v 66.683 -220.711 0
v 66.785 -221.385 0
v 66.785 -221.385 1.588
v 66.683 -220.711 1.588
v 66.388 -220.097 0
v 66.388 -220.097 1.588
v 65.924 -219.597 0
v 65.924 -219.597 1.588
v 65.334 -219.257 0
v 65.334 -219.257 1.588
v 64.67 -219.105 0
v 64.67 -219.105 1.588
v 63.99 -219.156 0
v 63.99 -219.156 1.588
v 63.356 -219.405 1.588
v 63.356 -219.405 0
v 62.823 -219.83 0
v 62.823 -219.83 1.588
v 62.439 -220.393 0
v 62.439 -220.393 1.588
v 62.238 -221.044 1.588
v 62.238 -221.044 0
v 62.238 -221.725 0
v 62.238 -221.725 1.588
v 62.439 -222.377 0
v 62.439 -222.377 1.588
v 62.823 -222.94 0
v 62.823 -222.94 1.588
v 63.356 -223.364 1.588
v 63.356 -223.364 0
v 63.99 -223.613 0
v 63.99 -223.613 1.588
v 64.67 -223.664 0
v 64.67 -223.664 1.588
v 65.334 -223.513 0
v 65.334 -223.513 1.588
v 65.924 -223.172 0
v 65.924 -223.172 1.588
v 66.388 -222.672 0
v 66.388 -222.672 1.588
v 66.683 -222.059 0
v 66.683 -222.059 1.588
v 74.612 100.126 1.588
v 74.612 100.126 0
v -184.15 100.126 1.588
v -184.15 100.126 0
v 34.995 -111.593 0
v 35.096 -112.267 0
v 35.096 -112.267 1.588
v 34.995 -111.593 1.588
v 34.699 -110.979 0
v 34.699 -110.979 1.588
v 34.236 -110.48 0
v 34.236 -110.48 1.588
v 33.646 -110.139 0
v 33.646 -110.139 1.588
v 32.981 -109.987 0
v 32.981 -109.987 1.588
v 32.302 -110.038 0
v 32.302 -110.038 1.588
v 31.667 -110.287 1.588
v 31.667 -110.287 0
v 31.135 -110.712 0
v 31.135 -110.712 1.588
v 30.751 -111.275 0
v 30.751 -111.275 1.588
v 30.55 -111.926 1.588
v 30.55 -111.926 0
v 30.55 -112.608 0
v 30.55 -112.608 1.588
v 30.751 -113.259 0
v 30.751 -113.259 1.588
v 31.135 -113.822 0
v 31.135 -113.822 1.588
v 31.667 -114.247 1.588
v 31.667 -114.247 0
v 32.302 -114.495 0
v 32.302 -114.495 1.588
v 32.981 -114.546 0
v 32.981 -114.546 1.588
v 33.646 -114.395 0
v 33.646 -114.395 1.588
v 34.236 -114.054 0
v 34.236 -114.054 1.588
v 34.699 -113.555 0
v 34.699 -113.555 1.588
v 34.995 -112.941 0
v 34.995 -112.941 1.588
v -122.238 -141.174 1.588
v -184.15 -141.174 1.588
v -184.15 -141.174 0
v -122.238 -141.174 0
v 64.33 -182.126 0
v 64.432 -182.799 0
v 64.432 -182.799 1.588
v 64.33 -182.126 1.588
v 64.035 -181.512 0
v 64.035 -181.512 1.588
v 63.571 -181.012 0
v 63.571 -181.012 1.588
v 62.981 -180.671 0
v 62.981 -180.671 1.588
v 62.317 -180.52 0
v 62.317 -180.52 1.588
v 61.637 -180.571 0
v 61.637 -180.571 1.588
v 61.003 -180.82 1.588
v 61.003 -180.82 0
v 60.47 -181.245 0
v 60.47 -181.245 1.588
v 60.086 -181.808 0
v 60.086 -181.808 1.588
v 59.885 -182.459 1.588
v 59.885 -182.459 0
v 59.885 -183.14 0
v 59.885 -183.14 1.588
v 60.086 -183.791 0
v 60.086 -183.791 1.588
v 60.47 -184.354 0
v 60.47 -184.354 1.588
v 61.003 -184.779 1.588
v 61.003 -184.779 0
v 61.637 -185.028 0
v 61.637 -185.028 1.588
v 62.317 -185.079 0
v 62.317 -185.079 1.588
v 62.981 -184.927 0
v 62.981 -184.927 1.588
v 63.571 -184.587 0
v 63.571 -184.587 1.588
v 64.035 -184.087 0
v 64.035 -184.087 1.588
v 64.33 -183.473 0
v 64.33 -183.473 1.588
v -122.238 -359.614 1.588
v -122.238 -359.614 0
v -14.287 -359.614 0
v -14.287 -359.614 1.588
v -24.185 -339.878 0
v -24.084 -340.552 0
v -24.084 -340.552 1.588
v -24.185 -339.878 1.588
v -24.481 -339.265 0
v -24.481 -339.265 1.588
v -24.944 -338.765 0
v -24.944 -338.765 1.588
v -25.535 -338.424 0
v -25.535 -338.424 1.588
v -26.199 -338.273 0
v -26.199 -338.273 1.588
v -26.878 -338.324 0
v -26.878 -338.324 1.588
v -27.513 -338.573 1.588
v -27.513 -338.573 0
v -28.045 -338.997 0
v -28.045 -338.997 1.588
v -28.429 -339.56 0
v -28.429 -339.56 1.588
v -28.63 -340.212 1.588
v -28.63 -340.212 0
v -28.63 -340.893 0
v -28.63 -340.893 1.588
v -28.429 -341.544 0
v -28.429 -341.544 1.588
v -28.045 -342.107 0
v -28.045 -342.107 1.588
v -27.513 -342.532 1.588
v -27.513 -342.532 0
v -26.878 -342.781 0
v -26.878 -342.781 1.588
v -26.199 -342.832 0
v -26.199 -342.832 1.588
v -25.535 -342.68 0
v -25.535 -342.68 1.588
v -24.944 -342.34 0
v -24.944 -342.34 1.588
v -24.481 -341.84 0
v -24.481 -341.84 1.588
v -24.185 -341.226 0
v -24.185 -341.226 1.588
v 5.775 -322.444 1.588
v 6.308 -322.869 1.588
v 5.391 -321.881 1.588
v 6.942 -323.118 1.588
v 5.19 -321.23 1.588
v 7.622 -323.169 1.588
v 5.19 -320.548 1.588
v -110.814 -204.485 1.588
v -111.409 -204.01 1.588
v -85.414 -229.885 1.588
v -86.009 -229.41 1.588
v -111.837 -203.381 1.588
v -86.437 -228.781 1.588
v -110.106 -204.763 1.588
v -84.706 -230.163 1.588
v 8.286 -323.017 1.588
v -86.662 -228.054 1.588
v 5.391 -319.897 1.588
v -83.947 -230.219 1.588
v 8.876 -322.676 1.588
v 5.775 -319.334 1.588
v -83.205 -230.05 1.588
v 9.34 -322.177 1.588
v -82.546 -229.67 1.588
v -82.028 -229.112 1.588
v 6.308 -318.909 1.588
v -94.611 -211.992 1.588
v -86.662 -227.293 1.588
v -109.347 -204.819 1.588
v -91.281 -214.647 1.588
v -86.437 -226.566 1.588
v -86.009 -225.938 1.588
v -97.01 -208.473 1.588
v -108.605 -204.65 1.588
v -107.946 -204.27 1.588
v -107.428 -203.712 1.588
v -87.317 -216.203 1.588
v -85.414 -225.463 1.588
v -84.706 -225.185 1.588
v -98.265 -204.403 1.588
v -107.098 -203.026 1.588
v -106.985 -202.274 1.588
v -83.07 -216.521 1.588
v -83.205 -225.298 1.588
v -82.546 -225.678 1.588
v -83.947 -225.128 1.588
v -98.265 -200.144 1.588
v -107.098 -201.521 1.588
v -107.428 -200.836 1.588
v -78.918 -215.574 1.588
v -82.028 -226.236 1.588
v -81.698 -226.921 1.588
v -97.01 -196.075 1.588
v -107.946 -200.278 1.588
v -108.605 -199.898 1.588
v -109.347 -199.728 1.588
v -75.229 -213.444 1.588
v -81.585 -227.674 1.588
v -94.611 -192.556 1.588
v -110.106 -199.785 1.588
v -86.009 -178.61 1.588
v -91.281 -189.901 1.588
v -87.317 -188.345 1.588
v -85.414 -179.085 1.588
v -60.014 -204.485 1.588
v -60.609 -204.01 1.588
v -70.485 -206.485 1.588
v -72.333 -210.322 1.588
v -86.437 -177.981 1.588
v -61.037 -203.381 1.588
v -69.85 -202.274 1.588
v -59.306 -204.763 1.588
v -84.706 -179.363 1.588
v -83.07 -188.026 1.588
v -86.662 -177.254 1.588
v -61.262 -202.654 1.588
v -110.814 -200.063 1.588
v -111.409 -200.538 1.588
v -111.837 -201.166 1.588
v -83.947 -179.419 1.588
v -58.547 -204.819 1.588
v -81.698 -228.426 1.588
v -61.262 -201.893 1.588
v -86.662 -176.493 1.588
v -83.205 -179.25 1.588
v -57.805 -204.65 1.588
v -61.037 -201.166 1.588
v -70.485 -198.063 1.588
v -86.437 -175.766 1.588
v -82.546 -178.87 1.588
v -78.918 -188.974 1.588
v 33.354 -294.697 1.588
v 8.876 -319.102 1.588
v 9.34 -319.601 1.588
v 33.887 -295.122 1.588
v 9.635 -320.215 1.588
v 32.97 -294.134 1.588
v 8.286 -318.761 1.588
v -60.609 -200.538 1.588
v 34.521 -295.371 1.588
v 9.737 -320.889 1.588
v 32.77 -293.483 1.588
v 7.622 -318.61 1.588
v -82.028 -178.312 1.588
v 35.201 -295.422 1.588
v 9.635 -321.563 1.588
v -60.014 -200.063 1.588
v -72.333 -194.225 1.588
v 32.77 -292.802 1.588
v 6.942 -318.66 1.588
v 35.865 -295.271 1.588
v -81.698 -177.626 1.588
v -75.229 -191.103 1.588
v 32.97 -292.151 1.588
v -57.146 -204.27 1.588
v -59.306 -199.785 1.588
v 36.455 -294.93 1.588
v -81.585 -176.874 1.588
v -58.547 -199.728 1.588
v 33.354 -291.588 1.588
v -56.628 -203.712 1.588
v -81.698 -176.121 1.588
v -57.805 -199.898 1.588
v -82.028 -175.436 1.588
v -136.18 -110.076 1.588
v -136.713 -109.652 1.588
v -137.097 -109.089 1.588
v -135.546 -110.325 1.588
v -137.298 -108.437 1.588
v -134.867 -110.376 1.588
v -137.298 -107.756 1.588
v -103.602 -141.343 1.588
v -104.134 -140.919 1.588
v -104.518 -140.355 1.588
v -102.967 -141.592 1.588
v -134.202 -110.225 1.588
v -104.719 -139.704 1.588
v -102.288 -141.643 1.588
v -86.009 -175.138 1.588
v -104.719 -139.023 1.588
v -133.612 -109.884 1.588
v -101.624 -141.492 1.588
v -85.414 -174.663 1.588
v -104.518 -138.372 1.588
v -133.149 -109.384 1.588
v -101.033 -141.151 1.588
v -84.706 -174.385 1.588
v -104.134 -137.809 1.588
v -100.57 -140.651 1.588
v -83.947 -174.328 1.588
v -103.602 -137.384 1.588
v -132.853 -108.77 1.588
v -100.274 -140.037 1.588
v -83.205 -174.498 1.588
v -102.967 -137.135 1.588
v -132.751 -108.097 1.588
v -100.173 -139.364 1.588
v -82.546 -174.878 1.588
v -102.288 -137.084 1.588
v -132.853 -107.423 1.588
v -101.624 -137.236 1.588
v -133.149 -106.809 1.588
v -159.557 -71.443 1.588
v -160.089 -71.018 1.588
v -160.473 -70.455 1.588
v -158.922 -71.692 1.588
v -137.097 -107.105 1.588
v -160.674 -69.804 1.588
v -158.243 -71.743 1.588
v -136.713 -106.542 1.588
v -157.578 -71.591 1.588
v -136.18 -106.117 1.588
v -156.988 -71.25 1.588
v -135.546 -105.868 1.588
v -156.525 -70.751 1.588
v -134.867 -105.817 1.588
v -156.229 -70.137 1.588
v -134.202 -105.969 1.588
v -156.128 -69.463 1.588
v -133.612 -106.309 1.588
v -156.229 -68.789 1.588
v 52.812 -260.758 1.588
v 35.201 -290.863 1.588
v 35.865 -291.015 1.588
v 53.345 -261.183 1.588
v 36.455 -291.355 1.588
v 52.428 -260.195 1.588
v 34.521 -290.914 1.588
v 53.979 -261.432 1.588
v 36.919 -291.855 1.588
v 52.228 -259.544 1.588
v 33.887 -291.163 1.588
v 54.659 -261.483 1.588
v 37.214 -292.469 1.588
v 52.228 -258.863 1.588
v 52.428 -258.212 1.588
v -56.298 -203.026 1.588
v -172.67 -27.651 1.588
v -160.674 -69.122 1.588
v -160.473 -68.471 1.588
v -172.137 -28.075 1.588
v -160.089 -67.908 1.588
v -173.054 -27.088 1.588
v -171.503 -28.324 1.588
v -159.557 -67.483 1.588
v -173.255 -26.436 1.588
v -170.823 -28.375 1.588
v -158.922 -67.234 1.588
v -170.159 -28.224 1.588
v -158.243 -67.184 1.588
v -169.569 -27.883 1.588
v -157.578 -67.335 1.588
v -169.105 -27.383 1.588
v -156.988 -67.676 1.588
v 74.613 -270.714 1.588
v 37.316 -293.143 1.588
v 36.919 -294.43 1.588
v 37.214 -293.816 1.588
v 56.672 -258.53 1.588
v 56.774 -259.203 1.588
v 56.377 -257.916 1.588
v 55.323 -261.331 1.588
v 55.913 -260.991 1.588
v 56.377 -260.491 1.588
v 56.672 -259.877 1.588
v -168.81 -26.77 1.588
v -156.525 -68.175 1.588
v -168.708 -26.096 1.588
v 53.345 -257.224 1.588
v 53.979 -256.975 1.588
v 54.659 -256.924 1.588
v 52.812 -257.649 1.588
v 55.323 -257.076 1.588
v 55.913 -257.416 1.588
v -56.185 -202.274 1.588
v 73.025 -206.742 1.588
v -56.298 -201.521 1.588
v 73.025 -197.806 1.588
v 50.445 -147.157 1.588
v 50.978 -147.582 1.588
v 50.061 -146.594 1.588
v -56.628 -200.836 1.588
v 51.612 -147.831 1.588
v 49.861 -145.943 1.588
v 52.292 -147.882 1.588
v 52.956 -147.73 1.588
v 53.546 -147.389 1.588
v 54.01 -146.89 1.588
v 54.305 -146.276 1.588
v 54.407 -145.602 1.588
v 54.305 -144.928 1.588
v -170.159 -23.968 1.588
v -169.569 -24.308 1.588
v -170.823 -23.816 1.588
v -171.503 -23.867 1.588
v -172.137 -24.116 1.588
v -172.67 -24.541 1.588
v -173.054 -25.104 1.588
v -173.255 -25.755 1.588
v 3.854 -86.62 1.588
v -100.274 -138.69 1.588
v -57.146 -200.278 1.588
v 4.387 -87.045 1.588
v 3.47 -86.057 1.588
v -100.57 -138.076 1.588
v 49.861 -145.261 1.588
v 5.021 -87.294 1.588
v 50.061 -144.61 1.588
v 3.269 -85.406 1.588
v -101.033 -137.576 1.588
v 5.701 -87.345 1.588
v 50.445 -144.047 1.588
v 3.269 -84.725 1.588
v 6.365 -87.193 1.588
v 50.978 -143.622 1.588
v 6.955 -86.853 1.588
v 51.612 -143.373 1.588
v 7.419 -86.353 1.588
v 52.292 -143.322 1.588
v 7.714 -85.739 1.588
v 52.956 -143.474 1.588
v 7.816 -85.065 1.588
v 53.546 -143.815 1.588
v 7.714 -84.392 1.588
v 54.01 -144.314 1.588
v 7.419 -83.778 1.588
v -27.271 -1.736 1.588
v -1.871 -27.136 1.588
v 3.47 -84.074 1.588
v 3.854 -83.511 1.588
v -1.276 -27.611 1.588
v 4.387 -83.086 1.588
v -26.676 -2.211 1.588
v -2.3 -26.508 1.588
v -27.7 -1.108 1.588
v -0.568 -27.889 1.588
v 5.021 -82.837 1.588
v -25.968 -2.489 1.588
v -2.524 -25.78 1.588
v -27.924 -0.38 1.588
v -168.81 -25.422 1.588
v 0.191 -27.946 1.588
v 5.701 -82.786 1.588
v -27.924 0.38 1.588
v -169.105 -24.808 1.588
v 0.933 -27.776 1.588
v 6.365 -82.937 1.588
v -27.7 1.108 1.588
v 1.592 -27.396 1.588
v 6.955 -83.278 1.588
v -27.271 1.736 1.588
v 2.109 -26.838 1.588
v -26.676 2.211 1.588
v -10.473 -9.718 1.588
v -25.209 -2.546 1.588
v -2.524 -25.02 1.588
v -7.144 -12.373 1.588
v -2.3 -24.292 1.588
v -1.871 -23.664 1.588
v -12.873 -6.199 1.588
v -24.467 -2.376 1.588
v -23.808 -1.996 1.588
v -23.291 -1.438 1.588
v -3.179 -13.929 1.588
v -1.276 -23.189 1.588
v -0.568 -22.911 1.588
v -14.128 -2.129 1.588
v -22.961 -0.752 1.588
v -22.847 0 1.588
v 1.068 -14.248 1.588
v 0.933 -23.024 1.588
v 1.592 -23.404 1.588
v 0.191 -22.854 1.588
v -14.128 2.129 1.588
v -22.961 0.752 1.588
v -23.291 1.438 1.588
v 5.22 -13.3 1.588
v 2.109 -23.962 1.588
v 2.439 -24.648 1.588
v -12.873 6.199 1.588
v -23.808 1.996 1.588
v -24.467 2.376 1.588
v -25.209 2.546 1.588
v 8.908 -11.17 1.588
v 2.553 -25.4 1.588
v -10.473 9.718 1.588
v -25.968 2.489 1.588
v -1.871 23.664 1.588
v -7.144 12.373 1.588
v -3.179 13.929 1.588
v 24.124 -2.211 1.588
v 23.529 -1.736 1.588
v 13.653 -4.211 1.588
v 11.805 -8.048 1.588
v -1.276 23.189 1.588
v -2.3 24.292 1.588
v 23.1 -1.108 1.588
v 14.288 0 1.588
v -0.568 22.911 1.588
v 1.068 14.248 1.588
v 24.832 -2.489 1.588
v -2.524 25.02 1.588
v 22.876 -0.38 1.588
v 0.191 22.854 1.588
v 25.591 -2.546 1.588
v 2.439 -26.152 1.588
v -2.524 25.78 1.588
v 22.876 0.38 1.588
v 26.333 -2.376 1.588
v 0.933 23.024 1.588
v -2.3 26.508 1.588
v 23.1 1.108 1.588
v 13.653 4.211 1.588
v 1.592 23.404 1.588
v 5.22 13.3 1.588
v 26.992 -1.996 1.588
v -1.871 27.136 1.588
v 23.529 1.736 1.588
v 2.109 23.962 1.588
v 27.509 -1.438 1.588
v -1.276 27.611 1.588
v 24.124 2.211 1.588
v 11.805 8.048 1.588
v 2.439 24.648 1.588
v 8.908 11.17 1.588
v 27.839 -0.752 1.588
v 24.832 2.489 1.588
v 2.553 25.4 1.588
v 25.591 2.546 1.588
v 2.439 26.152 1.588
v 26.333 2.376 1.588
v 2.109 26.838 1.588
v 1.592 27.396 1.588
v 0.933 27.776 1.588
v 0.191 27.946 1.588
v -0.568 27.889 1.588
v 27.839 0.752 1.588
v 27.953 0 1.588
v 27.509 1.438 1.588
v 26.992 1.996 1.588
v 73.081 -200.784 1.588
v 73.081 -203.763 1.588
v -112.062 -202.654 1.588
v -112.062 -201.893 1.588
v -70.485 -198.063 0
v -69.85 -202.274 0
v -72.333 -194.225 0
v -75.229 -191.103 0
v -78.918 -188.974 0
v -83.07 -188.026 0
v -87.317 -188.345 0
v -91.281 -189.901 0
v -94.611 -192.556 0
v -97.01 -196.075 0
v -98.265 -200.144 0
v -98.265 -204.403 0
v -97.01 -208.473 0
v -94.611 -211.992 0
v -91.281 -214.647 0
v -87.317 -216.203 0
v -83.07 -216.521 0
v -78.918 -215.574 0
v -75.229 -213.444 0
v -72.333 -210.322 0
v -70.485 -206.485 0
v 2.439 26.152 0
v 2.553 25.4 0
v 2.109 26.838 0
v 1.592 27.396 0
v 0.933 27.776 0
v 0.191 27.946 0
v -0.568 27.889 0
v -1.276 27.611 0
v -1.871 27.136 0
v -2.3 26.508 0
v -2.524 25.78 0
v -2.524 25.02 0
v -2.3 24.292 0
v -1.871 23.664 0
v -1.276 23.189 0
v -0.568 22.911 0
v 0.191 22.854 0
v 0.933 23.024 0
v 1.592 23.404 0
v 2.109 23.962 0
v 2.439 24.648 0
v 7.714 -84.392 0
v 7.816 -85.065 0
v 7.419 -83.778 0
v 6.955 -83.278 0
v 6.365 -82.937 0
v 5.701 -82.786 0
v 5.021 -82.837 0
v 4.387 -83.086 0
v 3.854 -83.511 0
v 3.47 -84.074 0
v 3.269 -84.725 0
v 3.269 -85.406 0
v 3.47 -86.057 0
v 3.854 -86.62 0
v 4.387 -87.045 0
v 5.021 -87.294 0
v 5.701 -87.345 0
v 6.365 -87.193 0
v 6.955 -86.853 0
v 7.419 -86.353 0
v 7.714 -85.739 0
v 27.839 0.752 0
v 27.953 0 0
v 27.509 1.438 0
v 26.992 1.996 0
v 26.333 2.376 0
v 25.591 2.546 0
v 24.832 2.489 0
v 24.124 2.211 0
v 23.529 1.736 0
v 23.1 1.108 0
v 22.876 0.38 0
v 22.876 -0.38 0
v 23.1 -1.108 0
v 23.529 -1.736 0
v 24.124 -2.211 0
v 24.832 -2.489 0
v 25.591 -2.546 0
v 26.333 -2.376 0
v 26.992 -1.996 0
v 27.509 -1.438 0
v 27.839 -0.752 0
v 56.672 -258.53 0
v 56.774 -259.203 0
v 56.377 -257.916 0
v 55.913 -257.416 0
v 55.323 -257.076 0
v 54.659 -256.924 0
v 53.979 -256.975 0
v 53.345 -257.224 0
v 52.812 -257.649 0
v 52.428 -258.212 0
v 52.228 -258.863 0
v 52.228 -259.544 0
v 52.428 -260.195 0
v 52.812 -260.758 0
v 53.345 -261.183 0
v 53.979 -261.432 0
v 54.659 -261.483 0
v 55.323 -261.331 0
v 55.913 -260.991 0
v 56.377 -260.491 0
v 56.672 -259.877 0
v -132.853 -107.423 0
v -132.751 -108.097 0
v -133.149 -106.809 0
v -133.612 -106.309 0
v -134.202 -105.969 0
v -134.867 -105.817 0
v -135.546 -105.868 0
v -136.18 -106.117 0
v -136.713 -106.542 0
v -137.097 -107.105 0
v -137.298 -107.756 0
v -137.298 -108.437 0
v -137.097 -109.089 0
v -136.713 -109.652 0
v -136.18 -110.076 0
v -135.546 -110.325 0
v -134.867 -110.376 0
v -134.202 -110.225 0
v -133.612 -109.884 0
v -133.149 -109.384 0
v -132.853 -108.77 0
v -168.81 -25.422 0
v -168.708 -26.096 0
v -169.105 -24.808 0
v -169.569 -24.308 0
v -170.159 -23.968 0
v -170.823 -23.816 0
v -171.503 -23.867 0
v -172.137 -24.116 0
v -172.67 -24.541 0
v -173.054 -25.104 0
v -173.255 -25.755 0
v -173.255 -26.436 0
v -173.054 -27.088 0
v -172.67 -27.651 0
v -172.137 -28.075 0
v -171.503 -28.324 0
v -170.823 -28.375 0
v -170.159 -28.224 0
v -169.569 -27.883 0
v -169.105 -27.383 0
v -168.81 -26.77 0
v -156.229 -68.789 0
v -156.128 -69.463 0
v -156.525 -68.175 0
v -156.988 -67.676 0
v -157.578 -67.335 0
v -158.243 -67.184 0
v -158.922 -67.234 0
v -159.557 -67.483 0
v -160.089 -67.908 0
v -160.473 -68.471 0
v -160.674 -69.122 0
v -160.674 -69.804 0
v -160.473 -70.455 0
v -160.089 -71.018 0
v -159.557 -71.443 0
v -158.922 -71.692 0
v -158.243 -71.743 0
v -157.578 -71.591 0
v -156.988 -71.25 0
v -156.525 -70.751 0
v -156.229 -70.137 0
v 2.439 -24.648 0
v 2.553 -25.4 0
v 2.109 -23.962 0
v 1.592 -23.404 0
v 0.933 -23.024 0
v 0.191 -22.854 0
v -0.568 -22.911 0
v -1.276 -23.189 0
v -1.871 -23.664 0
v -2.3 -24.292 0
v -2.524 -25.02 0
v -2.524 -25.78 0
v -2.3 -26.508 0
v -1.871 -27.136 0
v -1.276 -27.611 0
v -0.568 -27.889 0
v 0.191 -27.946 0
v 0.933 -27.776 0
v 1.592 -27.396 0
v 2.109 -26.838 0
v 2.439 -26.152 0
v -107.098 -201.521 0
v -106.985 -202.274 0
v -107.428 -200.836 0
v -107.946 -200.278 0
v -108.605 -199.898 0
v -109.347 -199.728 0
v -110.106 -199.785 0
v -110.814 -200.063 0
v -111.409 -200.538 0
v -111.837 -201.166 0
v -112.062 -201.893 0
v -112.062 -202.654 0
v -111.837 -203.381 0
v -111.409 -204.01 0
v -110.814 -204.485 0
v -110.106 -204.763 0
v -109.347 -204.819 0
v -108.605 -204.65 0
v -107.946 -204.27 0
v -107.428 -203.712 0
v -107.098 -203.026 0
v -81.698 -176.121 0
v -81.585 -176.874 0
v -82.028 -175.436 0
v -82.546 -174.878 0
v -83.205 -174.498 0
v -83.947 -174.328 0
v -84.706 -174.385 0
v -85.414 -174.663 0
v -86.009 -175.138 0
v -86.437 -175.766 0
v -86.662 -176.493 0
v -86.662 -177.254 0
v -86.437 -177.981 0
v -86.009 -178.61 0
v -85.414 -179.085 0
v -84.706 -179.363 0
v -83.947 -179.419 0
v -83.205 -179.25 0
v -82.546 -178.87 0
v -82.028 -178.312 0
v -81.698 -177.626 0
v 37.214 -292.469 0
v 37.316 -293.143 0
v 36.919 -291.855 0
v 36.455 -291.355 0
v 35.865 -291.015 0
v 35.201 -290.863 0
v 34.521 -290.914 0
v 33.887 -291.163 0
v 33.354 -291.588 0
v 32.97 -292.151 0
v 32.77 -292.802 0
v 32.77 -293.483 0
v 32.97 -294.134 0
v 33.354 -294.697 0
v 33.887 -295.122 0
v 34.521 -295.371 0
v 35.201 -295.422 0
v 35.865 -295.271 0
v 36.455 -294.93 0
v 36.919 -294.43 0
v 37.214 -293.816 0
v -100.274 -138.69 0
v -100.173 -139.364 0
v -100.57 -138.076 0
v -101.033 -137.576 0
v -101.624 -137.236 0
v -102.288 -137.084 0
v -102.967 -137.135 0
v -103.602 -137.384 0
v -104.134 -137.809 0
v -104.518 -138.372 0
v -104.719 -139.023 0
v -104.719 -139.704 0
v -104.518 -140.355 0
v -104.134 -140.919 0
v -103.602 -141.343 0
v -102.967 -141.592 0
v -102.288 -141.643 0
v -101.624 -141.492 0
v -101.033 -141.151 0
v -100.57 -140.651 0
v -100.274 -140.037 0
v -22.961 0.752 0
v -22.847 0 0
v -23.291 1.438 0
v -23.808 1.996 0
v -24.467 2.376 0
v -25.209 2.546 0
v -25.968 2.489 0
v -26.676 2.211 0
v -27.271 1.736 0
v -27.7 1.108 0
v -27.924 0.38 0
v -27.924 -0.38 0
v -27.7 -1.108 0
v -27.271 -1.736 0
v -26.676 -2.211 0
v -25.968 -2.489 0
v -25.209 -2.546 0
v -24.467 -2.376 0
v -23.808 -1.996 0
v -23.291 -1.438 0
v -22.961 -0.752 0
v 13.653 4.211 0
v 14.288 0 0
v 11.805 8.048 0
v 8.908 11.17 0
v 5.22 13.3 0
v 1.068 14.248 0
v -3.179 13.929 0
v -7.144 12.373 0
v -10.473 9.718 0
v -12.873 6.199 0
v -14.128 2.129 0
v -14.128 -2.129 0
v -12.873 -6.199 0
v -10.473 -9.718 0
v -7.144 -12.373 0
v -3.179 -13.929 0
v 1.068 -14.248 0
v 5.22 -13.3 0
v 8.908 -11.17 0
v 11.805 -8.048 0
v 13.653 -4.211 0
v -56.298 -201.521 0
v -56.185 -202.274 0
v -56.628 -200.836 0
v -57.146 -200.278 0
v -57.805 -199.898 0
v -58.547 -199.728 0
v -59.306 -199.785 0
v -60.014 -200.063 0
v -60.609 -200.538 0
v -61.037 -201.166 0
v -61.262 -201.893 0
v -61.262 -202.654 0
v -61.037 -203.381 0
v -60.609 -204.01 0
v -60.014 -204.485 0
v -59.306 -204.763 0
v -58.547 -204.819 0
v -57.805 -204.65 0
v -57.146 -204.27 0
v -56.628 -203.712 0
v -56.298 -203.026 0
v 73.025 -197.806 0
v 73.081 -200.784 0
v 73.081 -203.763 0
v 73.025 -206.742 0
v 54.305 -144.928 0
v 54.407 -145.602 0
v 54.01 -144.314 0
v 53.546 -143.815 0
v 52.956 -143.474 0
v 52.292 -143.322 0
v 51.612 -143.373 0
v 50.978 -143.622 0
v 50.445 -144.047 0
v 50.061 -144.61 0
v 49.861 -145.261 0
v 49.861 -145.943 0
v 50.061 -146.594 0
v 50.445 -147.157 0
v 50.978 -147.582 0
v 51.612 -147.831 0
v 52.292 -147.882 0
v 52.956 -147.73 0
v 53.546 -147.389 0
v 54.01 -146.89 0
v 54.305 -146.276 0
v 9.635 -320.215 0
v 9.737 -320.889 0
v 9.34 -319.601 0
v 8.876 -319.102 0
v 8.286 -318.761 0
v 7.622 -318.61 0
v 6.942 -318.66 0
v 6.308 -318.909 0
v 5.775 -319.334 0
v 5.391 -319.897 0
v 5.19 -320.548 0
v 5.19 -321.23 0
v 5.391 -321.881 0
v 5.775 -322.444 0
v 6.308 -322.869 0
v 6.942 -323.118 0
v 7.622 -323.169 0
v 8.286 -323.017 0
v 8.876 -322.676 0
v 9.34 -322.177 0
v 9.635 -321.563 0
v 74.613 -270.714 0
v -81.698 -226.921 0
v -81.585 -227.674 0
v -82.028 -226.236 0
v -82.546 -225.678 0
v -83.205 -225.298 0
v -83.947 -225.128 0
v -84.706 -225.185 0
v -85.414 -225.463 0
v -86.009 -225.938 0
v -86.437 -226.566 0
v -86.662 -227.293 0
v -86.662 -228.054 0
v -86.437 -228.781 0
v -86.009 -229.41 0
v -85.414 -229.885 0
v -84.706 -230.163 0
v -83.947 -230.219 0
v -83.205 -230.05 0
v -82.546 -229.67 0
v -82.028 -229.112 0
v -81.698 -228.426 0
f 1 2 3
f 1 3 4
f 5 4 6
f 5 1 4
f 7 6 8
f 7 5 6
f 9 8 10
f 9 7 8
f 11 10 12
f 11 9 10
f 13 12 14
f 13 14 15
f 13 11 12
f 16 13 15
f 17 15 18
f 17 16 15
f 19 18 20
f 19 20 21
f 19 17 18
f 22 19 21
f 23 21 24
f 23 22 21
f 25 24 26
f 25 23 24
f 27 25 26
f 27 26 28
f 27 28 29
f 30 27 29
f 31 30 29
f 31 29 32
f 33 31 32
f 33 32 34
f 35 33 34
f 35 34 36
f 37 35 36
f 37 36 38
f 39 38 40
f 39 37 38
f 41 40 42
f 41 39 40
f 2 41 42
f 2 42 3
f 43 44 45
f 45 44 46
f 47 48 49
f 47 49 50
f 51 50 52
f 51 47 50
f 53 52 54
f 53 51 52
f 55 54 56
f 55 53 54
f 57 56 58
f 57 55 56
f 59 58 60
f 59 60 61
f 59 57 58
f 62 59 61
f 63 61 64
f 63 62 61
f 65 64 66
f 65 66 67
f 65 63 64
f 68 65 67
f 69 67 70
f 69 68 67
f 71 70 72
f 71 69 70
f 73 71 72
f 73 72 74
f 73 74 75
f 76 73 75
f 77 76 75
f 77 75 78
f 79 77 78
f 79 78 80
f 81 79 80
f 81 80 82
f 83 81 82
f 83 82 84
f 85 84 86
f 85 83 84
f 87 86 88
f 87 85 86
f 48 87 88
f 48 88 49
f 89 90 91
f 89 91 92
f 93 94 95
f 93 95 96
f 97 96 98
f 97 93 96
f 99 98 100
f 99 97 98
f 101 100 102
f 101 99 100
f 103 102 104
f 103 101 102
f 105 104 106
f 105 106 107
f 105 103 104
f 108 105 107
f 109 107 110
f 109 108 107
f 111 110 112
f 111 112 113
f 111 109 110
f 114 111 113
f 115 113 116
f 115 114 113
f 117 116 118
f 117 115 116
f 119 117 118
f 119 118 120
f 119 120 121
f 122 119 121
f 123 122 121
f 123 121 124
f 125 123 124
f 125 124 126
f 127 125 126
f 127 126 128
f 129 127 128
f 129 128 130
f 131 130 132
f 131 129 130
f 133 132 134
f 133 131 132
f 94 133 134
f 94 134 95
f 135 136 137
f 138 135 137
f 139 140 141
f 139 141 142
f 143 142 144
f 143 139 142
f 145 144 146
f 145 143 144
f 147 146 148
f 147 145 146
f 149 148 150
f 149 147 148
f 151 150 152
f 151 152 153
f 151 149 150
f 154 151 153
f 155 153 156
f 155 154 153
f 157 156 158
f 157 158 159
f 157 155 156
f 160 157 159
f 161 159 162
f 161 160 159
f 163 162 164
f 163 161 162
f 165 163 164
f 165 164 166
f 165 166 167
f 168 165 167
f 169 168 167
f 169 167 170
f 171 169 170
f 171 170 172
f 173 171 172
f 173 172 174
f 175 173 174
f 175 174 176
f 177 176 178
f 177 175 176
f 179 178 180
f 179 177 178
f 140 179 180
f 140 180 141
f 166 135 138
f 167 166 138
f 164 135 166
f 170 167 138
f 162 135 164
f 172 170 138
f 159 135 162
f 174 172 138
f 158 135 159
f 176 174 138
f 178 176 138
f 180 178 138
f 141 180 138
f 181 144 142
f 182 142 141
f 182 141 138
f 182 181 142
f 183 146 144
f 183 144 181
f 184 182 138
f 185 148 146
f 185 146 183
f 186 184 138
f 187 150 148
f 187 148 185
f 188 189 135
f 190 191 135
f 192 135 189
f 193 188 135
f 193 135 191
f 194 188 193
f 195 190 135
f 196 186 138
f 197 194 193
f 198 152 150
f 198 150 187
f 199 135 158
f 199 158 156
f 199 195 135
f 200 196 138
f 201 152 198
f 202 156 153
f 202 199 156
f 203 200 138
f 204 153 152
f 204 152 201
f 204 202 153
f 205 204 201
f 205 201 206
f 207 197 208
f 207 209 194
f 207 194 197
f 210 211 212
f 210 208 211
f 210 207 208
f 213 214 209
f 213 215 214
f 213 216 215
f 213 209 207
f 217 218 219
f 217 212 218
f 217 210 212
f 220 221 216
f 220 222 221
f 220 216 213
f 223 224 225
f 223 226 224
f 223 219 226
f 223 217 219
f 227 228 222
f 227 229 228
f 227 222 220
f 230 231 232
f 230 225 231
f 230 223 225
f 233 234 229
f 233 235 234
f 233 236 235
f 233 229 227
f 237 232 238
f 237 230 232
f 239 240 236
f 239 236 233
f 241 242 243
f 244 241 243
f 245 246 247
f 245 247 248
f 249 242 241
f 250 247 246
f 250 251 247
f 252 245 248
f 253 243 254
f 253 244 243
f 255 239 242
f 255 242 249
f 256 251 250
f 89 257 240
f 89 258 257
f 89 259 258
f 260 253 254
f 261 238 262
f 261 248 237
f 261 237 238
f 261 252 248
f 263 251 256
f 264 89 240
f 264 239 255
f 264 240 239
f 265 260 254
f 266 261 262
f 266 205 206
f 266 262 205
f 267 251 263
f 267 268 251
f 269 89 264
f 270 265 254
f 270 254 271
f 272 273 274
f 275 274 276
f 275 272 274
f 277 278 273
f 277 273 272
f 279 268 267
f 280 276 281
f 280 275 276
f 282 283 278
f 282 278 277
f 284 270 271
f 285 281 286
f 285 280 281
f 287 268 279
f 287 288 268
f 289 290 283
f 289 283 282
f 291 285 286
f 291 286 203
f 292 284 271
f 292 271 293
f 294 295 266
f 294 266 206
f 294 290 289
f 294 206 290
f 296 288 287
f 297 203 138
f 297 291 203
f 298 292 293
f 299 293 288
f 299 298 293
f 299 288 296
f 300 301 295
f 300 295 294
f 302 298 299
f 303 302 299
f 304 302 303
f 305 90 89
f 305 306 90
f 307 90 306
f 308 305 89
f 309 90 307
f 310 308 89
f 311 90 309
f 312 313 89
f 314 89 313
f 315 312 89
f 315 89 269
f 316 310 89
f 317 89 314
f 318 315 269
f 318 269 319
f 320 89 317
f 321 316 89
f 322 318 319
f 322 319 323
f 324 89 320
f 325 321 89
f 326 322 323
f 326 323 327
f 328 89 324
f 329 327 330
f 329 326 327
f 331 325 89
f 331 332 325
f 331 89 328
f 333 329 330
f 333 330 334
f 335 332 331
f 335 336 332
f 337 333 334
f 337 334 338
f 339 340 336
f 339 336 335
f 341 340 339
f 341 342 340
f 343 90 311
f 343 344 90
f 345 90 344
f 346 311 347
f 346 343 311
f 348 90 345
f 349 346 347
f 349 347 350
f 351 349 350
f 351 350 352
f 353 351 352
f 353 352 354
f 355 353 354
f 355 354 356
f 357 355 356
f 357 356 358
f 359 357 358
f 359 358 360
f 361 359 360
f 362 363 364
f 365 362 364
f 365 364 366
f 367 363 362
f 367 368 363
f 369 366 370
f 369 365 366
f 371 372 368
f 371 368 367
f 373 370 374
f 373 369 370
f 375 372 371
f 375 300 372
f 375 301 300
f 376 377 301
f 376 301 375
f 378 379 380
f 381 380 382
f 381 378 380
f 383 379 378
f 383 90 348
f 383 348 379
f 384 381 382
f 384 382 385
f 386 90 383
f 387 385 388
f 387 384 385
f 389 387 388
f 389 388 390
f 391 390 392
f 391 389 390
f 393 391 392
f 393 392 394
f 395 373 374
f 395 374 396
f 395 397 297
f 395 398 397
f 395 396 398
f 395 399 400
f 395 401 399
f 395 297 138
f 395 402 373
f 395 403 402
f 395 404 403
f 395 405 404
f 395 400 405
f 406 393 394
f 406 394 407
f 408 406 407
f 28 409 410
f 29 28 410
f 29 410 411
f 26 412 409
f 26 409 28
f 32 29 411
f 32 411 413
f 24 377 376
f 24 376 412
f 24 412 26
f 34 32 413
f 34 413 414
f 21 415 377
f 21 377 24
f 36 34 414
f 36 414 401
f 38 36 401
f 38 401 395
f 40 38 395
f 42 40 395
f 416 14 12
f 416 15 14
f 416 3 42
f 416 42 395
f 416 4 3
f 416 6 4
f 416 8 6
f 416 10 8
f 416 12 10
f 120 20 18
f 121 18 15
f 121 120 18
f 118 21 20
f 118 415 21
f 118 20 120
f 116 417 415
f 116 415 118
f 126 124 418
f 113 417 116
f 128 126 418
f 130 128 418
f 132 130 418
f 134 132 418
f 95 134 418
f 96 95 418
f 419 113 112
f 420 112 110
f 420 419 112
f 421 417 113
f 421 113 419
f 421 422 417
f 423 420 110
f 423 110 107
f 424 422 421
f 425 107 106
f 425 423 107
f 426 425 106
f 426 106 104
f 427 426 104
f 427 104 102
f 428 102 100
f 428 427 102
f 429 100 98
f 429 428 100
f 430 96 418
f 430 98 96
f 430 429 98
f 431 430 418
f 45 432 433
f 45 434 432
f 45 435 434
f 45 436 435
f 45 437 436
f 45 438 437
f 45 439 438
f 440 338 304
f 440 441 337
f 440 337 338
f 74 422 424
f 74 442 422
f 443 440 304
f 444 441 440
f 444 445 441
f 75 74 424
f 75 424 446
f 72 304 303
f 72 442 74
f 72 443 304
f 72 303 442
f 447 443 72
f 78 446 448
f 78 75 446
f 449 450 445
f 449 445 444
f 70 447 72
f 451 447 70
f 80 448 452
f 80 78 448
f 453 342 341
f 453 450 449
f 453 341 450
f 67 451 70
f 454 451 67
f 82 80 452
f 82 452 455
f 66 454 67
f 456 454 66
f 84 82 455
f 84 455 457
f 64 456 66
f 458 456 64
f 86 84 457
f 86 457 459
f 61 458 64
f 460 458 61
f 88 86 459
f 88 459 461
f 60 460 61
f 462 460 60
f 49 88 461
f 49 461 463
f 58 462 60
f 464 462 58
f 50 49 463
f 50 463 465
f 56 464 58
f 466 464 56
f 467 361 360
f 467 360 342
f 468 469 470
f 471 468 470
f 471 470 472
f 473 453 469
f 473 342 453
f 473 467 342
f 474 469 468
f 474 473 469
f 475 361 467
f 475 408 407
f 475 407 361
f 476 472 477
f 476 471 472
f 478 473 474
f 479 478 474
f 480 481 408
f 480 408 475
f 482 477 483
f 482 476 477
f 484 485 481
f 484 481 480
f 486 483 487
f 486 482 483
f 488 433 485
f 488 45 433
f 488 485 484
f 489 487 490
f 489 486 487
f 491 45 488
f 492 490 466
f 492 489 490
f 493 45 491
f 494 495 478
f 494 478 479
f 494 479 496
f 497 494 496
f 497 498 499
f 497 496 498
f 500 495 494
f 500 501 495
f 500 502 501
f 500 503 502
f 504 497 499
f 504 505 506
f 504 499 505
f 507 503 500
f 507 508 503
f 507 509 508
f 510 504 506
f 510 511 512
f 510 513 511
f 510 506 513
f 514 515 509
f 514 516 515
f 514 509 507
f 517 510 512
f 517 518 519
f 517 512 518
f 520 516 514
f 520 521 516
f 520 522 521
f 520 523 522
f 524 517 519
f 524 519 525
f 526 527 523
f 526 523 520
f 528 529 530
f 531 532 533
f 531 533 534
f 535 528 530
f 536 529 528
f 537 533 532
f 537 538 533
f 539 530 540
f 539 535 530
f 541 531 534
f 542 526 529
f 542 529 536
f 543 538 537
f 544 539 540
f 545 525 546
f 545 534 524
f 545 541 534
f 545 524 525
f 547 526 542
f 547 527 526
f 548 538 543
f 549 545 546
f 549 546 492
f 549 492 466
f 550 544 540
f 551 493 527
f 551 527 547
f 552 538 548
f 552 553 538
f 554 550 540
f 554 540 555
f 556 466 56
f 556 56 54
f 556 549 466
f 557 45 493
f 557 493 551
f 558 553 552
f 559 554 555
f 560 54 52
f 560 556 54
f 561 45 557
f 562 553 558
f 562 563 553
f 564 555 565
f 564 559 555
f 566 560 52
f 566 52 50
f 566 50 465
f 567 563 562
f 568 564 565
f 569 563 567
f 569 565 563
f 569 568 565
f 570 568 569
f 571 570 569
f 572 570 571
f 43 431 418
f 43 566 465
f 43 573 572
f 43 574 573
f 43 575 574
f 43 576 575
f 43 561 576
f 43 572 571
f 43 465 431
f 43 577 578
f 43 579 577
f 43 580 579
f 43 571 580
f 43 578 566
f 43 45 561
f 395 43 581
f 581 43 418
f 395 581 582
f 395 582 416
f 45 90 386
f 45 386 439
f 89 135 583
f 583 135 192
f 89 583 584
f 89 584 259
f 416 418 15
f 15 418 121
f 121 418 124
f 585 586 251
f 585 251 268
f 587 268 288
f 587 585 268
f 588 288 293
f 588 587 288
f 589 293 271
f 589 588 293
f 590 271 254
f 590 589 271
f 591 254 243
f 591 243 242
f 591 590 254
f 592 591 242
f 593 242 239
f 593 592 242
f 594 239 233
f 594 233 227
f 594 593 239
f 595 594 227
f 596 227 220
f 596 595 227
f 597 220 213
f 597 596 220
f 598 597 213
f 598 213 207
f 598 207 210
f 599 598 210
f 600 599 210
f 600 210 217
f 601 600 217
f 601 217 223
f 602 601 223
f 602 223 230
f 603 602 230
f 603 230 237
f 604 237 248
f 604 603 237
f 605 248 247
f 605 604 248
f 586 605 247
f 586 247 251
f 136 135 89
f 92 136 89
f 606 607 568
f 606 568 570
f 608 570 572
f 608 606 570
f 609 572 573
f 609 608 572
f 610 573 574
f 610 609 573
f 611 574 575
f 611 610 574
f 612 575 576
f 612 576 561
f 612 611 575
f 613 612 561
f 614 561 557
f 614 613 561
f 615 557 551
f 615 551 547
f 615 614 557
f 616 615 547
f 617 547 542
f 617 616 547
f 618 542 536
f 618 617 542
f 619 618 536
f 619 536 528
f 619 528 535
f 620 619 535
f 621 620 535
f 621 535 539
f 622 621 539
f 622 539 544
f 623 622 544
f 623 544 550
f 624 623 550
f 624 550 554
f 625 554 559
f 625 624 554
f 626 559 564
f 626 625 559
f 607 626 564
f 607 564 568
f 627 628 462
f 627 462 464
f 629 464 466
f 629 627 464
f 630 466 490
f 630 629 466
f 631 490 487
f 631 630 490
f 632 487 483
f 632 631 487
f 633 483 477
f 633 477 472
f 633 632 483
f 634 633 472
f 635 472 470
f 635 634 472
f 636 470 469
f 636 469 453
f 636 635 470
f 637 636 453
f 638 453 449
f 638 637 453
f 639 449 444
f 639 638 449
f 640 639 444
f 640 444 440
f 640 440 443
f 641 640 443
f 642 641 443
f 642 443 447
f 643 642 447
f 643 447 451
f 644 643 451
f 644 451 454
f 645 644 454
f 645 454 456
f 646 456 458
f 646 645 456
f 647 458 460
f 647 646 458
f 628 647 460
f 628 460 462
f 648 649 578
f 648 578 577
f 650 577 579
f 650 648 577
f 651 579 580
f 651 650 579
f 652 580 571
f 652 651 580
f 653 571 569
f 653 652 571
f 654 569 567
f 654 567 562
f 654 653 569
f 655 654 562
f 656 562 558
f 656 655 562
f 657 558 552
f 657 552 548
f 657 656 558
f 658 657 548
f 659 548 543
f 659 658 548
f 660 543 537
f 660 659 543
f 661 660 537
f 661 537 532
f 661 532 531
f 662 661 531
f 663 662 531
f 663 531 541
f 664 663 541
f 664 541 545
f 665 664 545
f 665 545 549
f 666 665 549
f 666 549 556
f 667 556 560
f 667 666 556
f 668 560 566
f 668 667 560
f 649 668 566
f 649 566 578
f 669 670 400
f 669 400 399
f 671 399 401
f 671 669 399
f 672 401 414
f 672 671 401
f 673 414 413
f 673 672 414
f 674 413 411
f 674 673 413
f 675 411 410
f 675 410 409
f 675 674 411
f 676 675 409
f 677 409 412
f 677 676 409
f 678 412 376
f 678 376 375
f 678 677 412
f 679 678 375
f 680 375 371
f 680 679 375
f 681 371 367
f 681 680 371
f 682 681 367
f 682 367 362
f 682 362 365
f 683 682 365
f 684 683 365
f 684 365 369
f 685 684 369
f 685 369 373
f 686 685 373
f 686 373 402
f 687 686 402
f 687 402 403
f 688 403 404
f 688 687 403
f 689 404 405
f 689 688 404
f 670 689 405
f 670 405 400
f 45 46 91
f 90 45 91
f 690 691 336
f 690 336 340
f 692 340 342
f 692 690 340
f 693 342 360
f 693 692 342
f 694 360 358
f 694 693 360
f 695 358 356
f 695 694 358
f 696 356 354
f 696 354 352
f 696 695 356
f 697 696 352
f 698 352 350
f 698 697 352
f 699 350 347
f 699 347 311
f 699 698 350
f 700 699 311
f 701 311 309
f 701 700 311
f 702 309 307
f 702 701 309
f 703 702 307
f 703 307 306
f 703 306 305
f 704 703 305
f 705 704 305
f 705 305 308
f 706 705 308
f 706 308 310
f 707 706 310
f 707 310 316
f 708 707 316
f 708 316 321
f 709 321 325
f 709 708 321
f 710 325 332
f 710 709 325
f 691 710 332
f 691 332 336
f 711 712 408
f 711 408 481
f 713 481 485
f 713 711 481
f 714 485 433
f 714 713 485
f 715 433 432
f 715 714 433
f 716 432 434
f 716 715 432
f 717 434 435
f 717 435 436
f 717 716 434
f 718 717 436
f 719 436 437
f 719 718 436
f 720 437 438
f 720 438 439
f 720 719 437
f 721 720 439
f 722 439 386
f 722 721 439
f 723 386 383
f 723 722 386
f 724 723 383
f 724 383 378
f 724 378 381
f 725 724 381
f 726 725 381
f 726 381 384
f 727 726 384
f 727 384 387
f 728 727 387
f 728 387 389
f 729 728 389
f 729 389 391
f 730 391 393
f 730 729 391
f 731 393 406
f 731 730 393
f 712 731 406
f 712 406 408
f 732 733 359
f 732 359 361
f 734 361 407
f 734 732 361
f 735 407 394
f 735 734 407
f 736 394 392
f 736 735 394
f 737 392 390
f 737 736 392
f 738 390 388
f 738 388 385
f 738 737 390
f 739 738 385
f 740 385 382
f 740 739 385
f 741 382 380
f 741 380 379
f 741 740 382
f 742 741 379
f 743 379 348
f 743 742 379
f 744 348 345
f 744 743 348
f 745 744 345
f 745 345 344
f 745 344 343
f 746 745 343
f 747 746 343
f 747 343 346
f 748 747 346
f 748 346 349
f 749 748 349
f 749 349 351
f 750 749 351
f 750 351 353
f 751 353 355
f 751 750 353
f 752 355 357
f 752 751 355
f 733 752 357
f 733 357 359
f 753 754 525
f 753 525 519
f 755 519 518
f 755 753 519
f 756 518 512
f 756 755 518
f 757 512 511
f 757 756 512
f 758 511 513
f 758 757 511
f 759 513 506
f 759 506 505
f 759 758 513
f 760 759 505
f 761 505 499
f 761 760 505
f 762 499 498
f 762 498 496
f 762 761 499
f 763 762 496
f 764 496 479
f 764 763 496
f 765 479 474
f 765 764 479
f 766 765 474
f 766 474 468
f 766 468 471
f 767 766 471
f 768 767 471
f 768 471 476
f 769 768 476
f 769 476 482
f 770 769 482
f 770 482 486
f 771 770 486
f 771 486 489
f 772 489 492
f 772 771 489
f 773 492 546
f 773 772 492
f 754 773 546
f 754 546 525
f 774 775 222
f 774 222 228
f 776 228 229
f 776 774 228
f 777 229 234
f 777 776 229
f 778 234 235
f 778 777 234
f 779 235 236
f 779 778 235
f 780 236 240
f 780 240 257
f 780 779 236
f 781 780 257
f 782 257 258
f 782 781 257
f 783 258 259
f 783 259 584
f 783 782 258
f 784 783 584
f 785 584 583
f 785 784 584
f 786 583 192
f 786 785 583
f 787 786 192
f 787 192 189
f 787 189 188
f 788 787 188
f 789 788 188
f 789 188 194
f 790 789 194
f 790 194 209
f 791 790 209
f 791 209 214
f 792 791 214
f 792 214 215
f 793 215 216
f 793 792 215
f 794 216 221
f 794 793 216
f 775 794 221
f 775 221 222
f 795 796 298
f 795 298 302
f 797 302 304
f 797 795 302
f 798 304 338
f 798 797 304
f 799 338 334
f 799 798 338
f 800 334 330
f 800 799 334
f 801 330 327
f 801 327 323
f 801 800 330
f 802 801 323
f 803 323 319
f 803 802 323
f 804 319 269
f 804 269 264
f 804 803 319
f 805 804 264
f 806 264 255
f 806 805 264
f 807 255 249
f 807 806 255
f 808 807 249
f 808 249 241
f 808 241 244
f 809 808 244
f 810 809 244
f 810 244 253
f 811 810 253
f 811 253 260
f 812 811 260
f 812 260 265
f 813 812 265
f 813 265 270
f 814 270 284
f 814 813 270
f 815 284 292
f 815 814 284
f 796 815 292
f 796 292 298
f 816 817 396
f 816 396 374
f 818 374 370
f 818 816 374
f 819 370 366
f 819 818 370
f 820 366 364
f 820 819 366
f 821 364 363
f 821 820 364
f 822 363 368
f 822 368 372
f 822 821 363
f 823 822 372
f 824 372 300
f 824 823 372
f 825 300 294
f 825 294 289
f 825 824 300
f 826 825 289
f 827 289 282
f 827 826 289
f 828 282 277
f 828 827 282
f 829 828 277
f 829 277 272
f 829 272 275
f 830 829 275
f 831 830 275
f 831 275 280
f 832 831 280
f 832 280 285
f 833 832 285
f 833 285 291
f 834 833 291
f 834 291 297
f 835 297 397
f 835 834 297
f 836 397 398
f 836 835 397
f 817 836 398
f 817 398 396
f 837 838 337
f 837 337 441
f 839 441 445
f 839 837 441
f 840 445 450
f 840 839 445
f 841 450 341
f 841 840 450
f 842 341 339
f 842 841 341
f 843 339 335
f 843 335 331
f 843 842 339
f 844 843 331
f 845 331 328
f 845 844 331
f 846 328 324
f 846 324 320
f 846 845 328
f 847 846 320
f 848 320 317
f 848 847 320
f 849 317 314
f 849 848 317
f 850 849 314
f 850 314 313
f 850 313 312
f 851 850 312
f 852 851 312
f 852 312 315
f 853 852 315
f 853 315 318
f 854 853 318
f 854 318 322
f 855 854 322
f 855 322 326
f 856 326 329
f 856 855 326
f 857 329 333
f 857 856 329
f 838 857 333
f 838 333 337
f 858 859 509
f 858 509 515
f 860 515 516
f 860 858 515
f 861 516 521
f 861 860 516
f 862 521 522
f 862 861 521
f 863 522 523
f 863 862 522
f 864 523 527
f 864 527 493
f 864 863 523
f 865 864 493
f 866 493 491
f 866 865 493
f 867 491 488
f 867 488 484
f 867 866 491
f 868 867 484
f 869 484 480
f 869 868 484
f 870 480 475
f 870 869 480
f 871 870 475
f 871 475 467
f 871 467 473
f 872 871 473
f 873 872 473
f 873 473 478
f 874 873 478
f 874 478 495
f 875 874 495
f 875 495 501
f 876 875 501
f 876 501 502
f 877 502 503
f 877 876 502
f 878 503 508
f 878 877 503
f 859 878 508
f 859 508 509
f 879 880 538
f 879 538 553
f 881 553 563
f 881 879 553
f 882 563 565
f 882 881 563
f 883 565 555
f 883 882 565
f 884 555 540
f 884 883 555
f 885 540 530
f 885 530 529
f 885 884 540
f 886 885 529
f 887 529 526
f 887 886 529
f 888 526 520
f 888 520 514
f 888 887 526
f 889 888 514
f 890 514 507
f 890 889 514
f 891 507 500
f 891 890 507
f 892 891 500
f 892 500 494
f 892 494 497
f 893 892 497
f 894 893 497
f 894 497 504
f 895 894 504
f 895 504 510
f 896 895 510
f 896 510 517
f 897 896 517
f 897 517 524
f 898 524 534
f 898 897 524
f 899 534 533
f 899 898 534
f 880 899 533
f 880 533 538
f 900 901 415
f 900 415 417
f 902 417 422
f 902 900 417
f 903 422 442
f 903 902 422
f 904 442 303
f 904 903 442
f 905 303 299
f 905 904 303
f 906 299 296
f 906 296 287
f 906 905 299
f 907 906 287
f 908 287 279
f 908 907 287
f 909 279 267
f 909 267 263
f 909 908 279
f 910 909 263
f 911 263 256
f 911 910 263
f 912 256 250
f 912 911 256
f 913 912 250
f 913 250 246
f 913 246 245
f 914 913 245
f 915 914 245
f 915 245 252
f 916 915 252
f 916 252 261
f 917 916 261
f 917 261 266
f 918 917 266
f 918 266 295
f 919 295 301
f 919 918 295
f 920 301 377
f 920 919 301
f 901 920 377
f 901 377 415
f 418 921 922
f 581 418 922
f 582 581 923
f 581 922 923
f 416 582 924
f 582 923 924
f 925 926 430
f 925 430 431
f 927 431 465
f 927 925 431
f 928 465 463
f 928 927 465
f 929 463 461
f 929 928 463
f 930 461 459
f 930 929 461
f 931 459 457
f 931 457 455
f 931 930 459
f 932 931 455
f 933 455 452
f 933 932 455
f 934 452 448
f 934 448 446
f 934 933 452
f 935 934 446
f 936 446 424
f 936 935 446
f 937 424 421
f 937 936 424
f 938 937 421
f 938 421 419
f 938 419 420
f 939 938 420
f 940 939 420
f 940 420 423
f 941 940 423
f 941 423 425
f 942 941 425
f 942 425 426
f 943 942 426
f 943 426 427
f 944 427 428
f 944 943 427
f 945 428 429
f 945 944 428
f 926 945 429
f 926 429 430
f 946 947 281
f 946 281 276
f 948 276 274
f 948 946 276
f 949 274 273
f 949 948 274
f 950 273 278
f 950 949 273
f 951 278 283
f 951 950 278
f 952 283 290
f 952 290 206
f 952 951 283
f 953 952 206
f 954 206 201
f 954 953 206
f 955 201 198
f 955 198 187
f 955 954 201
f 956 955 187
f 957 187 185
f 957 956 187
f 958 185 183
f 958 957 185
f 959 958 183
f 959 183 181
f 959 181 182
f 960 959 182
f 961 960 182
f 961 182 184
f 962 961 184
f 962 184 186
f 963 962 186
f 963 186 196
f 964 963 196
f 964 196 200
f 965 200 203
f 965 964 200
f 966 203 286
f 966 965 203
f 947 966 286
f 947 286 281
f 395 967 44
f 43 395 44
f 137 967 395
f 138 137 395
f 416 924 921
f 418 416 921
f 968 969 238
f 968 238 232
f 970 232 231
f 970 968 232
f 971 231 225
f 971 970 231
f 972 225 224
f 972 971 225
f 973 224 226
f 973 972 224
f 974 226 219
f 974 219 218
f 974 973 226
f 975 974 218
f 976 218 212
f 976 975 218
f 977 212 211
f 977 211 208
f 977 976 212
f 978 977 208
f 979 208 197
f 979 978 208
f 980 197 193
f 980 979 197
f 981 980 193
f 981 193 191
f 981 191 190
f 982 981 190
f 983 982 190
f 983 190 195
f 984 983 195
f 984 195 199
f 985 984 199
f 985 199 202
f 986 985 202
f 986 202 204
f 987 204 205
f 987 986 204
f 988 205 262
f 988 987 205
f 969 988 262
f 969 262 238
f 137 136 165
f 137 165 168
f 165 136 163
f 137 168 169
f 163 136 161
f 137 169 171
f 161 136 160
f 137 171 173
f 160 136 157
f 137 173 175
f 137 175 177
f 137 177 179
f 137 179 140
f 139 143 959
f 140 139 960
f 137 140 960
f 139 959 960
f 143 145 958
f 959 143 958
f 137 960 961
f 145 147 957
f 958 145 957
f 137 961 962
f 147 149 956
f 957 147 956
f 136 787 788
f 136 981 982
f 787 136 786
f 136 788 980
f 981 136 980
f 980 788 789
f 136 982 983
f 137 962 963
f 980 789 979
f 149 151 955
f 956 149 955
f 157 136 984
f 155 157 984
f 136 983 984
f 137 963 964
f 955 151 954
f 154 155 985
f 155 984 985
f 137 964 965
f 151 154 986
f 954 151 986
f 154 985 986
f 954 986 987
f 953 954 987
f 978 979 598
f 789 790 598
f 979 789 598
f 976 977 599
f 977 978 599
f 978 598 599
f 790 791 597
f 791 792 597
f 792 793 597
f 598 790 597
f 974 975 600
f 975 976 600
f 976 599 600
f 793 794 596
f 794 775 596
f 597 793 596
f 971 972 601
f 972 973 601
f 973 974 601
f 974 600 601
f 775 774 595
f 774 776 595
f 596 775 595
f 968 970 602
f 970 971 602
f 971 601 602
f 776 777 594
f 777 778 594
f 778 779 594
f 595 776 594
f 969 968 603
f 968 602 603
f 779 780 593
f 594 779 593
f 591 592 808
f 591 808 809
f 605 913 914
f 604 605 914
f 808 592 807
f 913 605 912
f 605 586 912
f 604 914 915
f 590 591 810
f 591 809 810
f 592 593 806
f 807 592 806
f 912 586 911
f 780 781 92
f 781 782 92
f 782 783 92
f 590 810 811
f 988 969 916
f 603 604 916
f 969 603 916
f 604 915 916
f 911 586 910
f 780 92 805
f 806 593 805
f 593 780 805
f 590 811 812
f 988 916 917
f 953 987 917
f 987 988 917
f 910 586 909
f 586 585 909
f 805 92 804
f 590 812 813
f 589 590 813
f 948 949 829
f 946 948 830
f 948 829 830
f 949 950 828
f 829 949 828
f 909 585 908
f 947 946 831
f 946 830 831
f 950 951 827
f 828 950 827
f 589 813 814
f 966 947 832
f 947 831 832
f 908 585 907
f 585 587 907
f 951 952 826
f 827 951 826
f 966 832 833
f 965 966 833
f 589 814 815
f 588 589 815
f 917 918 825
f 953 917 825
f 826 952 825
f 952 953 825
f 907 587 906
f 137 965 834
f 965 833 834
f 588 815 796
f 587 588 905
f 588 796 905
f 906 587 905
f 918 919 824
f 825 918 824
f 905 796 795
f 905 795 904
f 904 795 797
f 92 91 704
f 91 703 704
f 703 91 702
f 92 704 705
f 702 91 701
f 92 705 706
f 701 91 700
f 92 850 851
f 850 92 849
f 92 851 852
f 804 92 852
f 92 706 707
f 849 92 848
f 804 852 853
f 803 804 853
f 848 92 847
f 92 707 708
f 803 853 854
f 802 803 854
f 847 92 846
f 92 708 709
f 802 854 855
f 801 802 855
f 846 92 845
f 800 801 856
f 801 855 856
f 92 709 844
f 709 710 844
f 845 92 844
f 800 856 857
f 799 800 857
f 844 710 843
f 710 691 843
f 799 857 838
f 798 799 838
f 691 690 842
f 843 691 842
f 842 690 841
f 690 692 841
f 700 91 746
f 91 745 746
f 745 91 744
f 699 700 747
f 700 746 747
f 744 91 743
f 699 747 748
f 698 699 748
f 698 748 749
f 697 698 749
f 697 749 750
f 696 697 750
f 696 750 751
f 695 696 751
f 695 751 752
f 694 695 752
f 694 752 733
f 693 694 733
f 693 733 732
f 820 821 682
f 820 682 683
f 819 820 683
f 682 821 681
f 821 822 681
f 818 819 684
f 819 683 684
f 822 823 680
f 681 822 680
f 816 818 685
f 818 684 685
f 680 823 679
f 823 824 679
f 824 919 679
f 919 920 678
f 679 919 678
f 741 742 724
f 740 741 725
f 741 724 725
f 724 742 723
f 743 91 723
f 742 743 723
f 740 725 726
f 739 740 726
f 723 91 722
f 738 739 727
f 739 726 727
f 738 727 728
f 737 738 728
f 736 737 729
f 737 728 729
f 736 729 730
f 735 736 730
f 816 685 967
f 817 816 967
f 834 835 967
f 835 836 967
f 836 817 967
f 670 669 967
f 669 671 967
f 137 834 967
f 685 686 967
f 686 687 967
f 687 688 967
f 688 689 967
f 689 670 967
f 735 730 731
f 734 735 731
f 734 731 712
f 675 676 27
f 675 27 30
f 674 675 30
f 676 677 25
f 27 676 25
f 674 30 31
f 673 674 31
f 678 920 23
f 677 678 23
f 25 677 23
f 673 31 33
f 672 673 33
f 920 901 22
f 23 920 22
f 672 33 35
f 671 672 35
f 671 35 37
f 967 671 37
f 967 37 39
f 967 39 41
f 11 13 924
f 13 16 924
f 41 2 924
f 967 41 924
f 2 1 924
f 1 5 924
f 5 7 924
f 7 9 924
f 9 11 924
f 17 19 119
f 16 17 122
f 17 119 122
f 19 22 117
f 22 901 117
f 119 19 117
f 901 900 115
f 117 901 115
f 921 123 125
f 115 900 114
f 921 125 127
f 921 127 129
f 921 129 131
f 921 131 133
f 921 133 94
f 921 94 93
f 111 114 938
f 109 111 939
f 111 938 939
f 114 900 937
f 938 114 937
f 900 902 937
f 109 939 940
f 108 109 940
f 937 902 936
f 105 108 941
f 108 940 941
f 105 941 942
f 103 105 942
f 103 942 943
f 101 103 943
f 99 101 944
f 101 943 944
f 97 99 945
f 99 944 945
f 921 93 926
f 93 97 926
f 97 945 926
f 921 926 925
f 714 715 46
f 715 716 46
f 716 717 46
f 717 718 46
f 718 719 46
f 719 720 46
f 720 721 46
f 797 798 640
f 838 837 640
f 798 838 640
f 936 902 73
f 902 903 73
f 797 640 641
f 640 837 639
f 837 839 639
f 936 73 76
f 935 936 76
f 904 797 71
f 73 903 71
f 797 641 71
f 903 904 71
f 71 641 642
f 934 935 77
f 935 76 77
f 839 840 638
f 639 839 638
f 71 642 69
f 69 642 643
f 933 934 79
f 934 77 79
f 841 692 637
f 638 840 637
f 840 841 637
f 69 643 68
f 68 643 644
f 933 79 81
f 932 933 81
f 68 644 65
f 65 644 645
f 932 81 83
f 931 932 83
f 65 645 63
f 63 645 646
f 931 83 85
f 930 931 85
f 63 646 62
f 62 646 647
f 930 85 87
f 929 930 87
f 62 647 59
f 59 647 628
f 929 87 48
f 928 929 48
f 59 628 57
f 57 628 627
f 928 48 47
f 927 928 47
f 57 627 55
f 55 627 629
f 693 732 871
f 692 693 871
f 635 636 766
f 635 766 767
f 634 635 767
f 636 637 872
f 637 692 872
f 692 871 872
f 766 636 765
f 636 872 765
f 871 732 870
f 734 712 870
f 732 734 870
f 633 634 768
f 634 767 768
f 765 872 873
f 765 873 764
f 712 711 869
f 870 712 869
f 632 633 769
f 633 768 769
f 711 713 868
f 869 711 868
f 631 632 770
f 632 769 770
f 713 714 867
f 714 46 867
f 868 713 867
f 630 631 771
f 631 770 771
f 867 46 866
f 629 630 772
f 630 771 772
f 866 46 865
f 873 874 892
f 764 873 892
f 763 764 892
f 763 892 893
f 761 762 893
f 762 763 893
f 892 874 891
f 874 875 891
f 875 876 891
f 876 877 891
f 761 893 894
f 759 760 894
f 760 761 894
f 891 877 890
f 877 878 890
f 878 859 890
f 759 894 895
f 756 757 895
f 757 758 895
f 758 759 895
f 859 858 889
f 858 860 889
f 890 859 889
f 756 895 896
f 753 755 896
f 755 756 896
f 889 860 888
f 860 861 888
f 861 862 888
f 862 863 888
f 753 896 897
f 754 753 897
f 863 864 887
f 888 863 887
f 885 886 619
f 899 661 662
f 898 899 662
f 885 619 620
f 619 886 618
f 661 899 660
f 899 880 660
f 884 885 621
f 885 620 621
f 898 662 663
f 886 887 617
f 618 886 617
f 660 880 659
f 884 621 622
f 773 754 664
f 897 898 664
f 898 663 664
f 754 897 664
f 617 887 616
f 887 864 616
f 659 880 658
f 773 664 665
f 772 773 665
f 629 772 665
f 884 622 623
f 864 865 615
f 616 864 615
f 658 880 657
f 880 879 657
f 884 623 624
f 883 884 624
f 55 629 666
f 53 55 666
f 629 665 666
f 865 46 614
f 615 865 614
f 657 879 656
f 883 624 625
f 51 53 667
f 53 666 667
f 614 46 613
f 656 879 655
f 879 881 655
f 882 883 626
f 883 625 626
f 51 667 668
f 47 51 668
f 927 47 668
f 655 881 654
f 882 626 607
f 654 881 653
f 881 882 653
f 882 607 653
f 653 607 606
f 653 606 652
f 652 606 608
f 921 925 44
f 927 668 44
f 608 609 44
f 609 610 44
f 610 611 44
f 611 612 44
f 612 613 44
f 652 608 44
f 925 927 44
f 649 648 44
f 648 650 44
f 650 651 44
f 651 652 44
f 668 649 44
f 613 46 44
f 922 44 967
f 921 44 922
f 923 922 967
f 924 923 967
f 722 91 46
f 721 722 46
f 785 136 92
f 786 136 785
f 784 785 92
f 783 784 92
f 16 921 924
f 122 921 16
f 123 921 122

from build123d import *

# Parameters (mm, degrees)
SKETCH1_R           = 2.5527
SKETCH1_R_2         = 14.2875
SKETCH1_R_3         = 2.286
BOSS_EXTRUDE1_DEPTH = 1.5875
SKETCH2_W           = 61.9125
SKETCH2_H           = 218.44
CUT_EXTRUDE1_DEPTH  = 2.5875
CHAMFER1_SIZE       = 88.9


with BuildPart() as part:
    # Sketch1 → Boss-Extrude1 (new body)
    with BuildSketch(Plane.XY):
        with BuildLine():
            Line((-182.5625, -359.614215072), (74.6125, -359.614215072))
            Line((74.6125, -359.614215072), (74.6125, 100.125784928))
            Line((74.6125, 100.125784928), (-184.15, 100.125784928))
            Line((-184.15, 100.125784928), (-184.15, -323.589680411))
            ThreePointArc((-184.15, -323.589680411), (-183.358351266, -324.237998925), (-182.5625, -324.881151609))
            Line((-182.5625, -324.881151609), (-182.5625, -359.614215072))
        make_face()
        with Locations((-84.1375, -227.673915072)):
            Circle(SKETCH1_R, mode=Mode.SUBTRACT)
        with Locations((-109.5375, -202.273915072)):
            Circle(SKETCH1_R, mode=Mode.SUBTRACT)
        with Locations((-84.1375, -202.273915072)):
            Circle(SKETCH1_R_2, mode=Mode.SUBTRACT)
        with Locations((-84.1375, -176.873915072)):
            Circle(SKETCH1_R, mode=Mode.SUBTRACT)
        with Locations((-58.7375, -202.273915072)):
            Circle(SKETCH1_R, mode=Mode.SUBTRACT)
        with Locations((-26.369714503, -340.552266808)):
            Circle(SKETCH1_R_3, mode=Mode.SUBTRACT)
        with Locations((7.450966894, -320.88914315)):
            Circle(SKETCH1_R_3, mode=Mode.SUBTRACT)
        with Locations((35.030045629, -293.14258772)):
            Circle(SKETCH1_R_3, mode=Mode.SUBTRACT)
        with Locations((54.488053063, -259.203482417)):
            Circle(SKETCH1_R_3, mode=Mode.SUBTRACT)
        with Locations((64.498958145, -221.384721179)):
            Circle(SKETCH1_R_3, mode=Mode.SUBTRACT)
        with BuildLine():
            Line((73.025, -206.741987336), (73.025, -202.273915072))
            Line((73.025, -202.273915072), (73.025, -197.805842809))
            ThreePointArc((73.025, -197.805842809), (73.0885, -202.273915072), (73.025, -206.741987336))
        make_face(mode=Mode.SUBTRACT)
        with Locations((62.145886508, -182.799411028)):
            Circle(SKETCH1_R_3, mode=Mode.SUBTRACT)
        with Locations((-158.413638358, -69.463111493)):
            Circle(SKETCH1_R_3, mode=Mode.SUBTRACT)
        with Locations((-135.03744834, -108.096679976)):
            Circle(SKETCH1_R_3, mode=Mode.SUBTRACT)
        with Locations((-102.458679377, -139.363638358)):
            Circle(SKETCH1_R_3, mode=Mode.SUBTRACT)
        with Locations((-170.994200713, -26.095746755)):
            Circle(SKETCH1_R_3, mode=Mode.SUBTRACT)
        with Locations((5.529920705, -85.065386628)):
            Circle(SKETCH1_R_3, mode=Mode.SUBTRACT)
        with Locations((32.810376845, -112.26680659)):
            Circle(SKETCH1_R_3, mode=Mode.SUBTRACT)
        with Locations((52.121028445, -145.602062252)):
            Circle(SKETCH1_R_3, mode=Mode.SUBTRACT)
        with Locations((0, -25.4)):
            Circle(SKETCH1_R, mode=Mode.SUBTRACT)
        with Locations((-25.4, 0)):
            Circle(SKETCH1_R, mode=Mode.SUBTRACT)
        Circle(SKETCH1_R_2, mode=Mode.SUBTRACT)
        with Locations((0, 25.4)):
            Circle(SKETCH1_R, mode=Mode.SUBTRACT)
        with Locations((25.4, 0)):
            Circle(SKETCH1_R, mode=Mode.SUBTRACT)
    extrude(amount=BOSS_EXTRUDE1_DEPTH)

    # Sketch2 → Cut-Extrude1 (cut, through all)
    with BuildSketch(Plane.XY.offset(1.5875)):
        with Locations((-153.19375, -250.394215072)):
            Rectangle(SKETCH2_W, SKETCH2_H)
    extrude(amount=-CUT_EXTRUDE1_DEPTH, mode=Mode.SUBTRACT)

    # Chamfer1
    chamfer1_edges = [part.edges().sort_by_distance(p)[0] for p in [
        (74.6125, -359.614215072, 0.79375),
    ]]
    chamfer(chamfer1_edges, length=CHAMFER1_SIZE)


solid = part.part
